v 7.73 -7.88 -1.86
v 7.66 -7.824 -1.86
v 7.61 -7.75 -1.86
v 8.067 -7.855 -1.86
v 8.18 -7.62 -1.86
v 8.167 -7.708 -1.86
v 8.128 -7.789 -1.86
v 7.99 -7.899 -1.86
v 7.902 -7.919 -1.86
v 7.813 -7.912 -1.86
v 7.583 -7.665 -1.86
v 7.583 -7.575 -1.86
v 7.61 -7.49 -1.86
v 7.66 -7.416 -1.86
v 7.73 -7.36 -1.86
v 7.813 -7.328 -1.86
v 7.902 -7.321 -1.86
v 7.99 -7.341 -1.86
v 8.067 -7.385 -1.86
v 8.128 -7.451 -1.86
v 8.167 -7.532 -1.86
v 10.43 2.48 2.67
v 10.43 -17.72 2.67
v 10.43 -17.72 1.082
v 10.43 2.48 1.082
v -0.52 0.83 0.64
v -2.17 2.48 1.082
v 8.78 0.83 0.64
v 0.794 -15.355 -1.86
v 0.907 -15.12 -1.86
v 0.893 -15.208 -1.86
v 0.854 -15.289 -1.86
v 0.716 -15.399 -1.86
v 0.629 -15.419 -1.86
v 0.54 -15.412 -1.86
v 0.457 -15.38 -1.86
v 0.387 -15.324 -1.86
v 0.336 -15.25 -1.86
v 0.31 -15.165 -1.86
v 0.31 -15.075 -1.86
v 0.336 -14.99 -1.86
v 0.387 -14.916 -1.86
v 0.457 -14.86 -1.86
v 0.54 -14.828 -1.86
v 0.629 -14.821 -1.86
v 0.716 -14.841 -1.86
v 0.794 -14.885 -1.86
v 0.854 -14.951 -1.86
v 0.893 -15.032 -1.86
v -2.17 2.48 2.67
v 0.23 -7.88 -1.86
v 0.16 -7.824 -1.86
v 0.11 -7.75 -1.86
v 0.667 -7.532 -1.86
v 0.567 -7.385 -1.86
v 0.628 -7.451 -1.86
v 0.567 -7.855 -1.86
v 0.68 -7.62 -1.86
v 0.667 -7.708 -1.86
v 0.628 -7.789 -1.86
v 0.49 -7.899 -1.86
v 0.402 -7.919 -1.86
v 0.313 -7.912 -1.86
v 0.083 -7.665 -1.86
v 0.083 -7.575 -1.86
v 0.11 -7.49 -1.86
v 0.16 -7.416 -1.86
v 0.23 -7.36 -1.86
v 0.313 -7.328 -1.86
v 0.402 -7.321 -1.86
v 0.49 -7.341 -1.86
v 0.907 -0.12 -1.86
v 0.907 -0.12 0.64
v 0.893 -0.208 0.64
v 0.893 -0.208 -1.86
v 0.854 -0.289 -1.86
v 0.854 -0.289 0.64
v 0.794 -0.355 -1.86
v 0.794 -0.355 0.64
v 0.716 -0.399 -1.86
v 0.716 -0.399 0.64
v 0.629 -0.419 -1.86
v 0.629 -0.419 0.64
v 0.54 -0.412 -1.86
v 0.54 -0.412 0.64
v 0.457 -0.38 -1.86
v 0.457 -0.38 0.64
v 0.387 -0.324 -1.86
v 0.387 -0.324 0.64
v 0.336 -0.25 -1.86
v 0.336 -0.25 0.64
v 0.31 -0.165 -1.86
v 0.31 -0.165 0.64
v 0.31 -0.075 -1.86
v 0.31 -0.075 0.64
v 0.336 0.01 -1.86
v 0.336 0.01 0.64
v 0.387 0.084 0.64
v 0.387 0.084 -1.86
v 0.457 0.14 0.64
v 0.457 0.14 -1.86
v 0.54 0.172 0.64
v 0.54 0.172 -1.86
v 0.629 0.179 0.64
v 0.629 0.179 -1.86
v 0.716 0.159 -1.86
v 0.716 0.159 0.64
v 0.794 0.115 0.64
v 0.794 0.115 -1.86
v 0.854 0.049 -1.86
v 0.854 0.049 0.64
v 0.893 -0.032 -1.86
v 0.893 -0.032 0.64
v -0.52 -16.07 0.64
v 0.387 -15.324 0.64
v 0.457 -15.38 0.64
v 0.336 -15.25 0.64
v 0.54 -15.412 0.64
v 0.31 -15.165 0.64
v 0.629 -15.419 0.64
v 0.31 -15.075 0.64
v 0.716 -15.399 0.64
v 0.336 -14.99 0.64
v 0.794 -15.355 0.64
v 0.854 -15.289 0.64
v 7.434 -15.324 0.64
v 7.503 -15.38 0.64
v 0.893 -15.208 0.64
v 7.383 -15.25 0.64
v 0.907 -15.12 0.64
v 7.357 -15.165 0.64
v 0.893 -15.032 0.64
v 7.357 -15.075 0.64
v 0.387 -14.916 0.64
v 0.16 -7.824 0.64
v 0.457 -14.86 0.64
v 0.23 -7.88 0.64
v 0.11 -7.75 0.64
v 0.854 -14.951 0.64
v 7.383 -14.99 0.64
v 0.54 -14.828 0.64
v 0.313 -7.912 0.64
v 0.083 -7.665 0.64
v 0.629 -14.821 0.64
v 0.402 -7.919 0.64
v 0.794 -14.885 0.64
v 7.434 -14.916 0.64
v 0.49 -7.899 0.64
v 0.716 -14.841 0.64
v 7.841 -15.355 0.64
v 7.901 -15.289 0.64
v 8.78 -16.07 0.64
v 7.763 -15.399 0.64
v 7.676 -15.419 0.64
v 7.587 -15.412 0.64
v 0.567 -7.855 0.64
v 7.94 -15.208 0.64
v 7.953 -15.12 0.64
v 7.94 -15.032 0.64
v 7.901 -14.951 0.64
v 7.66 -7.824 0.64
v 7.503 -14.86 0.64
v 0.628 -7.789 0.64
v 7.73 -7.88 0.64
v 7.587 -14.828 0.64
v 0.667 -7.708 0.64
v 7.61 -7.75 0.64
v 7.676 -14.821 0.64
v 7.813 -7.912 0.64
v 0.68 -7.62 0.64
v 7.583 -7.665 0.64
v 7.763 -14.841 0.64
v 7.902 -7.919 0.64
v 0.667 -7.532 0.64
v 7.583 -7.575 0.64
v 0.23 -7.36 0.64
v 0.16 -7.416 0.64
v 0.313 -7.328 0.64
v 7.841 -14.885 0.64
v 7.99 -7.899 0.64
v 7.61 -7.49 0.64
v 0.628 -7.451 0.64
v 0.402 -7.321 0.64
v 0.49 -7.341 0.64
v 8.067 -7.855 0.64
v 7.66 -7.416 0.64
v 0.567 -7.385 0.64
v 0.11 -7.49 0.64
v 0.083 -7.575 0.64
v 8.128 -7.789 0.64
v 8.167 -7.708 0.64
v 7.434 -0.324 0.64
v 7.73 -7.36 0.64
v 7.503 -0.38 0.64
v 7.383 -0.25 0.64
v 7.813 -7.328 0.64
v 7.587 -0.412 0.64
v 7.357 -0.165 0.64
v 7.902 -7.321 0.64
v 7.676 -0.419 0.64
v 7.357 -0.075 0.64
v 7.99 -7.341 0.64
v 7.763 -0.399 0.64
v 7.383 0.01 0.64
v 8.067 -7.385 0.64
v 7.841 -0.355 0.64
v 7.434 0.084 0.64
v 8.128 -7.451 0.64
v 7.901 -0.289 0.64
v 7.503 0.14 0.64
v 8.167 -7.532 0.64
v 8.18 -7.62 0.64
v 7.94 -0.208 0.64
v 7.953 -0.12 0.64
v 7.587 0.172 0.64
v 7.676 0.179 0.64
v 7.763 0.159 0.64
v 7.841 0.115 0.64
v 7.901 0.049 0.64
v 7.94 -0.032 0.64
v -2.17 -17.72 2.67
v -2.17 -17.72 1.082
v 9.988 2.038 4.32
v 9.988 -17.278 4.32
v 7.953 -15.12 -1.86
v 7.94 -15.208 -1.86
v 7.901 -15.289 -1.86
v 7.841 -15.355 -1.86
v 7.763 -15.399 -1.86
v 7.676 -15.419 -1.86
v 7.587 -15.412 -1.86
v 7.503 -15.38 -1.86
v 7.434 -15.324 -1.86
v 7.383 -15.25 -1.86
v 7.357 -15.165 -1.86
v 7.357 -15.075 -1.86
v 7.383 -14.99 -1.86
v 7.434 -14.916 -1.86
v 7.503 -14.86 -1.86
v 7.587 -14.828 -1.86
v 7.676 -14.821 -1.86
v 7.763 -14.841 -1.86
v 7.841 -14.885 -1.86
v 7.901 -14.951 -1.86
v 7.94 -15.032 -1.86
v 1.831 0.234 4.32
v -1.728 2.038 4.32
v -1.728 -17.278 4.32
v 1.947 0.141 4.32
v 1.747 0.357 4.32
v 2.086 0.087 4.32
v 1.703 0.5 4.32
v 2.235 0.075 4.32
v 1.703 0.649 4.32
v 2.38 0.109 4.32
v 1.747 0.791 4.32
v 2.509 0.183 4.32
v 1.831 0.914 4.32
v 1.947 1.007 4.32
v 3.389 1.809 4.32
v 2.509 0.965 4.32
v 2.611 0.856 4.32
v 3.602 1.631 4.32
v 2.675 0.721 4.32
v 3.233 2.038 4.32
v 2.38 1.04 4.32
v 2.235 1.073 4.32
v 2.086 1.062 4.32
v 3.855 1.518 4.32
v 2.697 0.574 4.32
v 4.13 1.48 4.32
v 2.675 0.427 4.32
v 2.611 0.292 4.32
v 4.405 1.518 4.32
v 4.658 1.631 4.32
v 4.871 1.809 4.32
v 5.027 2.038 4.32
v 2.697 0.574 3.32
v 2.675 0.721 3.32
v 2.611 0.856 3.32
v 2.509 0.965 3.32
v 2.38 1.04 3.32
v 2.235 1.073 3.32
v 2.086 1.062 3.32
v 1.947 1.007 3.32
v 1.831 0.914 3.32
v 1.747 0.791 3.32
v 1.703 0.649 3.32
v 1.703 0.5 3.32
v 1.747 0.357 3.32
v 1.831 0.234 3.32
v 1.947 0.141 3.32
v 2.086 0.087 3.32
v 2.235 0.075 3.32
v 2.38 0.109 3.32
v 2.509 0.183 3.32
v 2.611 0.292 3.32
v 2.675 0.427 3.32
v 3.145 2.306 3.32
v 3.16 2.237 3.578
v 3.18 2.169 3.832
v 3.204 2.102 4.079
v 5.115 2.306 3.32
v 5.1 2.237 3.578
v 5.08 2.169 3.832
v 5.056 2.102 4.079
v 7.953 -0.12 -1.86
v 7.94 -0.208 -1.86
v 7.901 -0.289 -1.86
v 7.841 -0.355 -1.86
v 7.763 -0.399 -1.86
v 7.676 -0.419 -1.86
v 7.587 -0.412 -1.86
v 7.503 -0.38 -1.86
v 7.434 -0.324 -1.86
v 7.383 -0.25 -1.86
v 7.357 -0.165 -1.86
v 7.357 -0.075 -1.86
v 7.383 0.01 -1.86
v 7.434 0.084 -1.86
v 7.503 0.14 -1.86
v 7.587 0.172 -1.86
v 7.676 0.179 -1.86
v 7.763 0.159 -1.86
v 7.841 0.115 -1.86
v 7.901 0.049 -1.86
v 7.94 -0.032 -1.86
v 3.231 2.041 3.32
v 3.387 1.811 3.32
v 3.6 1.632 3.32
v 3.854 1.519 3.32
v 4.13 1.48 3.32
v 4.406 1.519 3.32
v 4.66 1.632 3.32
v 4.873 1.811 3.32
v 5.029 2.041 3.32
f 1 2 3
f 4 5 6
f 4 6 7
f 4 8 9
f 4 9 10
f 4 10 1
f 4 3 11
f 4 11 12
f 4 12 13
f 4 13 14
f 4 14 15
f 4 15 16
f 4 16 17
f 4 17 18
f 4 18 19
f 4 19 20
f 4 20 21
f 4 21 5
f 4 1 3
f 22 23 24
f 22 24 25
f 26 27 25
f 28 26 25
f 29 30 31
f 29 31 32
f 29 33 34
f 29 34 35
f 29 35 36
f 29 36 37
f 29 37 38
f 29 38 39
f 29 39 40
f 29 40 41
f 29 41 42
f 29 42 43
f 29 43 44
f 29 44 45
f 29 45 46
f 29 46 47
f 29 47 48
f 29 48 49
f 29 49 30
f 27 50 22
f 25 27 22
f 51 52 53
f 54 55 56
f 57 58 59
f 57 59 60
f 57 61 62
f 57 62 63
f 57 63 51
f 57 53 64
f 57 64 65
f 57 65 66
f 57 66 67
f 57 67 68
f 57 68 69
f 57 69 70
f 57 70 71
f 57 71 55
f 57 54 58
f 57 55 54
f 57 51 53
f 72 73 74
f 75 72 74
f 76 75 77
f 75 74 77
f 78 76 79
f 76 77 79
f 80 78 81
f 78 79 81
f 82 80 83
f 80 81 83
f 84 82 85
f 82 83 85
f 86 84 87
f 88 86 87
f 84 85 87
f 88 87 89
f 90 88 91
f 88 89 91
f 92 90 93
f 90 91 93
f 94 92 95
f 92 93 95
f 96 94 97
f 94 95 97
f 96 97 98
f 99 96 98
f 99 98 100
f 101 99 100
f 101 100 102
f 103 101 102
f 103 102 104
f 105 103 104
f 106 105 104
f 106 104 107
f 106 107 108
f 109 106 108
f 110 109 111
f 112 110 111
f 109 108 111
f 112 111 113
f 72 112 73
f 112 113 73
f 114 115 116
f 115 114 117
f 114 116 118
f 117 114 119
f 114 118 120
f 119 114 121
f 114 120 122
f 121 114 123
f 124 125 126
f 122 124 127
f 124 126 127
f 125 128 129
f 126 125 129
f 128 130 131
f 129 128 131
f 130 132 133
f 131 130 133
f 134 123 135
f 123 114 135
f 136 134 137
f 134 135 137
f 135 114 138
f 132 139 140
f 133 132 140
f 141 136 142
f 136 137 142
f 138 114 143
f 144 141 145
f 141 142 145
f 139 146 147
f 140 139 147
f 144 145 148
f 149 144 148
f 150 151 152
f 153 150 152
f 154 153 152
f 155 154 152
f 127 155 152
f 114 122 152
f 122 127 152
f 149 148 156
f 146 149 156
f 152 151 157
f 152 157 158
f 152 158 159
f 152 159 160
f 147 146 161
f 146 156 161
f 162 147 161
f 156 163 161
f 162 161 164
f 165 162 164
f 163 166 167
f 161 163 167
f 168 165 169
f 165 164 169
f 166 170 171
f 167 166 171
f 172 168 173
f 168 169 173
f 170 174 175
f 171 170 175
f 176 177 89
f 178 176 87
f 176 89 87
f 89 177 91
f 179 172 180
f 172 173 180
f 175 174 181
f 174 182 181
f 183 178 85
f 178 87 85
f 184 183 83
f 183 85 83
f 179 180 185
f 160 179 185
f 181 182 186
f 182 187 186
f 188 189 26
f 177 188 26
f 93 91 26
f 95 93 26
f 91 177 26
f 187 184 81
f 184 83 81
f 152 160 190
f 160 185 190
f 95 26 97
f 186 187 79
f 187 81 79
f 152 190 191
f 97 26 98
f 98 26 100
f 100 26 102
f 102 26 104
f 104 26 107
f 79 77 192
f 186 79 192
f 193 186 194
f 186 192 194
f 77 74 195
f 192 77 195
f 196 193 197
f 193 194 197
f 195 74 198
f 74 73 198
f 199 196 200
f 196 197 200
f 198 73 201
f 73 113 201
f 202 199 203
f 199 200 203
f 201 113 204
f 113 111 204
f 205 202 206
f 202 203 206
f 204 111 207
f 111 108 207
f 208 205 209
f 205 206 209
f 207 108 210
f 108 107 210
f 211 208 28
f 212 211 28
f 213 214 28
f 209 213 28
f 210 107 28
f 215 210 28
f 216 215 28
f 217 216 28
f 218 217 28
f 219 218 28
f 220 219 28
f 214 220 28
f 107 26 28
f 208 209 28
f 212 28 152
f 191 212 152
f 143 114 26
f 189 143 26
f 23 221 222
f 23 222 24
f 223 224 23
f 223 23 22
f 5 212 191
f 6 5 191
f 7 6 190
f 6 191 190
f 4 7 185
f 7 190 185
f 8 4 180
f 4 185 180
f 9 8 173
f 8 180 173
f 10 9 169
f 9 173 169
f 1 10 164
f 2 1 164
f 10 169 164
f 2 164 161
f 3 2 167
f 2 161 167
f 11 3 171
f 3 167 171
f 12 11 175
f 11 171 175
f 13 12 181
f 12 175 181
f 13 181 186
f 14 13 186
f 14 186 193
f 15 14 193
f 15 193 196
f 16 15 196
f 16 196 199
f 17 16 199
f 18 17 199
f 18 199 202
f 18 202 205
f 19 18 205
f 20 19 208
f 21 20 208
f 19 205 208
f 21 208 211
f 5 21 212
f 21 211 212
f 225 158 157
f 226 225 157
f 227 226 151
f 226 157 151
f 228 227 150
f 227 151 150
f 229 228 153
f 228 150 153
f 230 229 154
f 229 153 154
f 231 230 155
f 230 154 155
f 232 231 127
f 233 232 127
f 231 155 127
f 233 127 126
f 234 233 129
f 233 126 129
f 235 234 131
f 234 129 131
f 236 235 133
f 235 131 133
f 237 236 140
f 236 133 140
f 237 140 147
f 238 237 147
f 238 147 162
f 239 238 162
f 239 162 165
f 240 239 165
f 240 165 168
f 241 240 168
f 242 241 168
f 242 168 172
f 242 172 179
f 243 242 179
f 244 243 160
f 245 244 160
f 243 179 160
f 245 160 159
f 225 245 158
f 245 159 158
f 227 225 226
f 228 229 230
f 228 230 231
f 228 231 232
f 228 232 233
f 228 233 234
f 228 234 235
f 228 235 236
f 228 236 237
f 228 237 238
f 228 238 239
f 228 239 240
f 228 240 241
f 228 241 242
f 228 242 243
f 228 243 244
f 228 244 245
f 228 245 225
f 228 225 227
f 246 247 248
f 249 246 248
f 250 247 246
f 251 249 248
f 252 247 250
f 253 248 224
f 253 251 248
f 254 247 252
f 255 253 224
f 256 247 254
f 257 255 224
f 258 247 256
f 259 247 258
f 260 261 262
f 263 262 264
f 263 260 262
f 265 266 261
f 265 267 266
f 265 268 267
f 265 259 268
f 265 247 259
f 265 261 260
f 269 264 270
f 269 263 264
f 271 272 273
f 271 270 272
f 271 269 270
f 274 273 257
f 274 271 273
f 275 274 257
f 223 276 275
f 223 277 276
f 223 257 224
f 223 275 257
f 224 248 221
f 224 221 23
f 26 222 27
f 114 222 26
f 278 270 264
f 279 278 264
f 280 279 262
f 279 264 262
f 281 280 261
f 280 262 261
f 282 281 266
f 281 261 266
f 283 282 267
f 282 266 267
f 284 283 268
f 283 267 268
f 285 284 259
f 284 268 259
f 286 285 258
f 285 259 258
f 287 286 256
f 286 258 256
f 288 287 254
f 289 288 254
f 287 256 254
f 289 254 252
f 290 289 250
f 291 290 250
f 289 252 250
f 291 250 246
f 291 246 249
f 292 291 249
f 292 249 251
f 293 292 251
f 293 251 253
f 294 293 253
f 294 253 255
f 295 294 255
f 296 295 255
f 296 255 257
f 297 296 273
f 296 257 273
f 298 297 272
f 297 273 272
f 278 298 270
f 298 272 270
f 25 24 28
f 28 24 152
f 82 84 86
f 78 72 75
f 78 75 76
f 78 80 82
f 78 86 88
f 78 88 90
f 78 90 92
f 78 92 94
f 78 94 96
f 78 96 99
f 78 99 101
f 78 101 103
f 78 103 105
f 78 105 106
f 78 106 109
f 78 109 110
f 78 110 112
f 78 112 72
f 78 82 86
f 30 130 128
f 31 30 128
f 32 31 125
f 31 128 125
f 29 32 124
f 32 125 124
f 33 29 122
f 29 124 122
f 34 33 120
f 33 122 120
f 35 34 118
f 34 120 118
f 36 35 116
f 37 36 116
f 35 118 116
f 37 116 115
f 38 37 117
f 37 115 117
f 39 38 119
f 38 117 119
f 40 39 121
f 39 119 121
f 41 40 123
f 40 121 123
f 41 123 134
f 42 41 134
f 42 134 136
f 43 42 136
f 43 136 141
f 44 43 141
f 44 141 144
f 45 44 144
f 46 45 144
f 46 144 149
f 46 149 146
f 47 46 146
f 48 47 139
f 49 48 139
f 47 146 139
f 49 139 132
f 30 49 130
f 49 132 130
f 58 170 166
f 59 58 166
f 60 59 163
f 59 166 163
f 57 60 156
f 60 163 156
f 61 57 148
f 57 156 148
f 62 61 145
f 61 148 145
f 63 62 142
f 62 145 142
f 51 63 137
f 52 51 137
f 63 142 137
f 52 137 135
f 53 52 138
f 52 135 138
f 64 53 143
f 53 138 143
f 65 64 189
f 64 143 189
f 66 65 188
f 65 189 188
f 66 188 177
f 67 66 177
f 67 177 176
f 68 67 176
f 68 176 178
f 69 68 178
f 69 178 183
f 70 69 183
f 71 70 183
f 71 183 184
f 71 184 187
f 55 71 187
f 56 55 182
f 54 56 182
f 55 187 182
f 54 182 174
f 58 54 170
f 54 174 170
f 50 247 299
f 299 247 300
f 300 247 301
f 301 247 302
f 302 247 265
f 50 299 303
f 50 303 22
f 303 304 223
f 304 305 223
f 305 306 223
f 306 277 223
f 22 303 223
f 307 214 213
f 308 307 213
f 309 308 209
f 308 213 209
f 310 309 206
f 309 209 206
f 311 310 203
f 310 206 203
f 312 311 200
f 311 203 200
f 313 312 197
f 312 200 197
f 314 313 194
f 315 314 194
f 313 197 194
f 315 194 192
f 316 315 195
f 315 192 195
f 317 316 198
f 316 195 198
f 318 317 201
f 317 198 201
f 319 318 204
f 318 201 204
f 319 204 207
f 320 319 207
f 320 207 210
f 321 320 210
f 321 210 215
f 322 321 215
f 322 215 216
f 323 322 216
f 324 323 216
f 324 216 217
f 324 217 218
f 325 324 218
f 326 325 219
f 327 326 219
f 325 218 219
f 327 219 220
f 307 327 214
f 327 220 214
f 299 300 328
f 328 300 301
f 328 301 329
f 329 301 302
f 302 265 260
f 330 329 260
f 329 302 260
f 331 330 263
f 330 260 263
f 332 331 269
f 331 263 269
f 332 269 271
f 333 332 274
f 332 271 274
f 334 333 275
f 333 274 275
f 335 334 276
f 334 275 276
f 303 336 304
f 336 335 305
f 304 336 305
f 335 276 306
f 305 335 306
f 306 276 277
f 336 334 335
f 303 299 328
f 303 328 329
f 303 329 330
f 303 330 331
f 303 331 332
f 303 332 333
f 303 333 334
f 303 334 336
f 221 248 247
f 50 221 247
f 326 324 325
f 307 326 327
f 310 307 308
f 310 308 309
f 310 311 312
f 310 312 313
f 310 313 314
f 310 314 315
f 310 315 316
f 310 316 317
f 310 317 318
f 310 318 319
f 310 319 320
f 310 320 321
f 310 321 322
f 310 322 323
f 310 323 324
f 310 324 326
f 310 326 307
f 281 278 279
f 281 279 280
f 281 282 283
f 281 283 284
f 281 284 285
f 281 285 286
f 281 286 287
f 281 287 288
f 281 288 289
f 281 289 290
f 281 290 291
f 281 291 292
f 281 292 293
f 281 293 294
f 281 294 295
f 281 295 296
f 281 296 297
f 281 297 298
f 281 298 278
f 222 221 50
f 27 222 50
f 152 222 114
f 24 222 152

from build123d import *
from OCP.BRepFilletAPI import BRepFilletAPI_MakeChamfer

# Parameters (mm, degrees)
SKETCH_2_W          = 12.6
SKETCH_2_H          = 20.2
EXTRUDE_1_DEPTH     = 3.68
CHAMFER_1_SIZE      = 1.65
CHAMFER_1_SIZE2     = 0.442116168
SKETCH_6_R          = 1
SKETCH_6_R_2        = 0.5
CUT_EXTRUDE_1_DEPTH = 1
SKETCH_7_R          = 0.3
EXTRUDE_2_DEPTH     = 2.5


with BuildPart() as part:
    # Эскиз2 → Вытянуть1 (new body)
    with BuildSketch(Plane.XY.offset(4.32)):
        with Locations((4.13, -7.62)):
            Rectangle(SKETCH_2_W, SKETCH_2_H)
    extrude(amount=-EXTRUDE_1_DEPTH)

    # Фаска1: one chamfer whose edges measure the first distance from different faces: ONE call of the kernel's chamfer builder (chamfer() names one face for all edges)
    chamfer_1_edges_1 = [part.edges().sort_by_distance(p)[0] for p in [
        (10.43, -7.62, 0.64),
        (4.13, 2.48, 0.64),
        (-2.17, -7.62, 0.64),
        (4.13, -17.72, 0.64),
    ]]
    chamfer_1_side_1 = [part.faces().sort_by_distance(p)[0] for p in [
        (4.13, -7.62, 0.64),
    ]]
    chamfer_1_edges_2 = [part.edges().sort_by_distance(p)[0] for p in [
        (4.13, 2.48, 4.32),
    ]]
    chamfer_1_side_2 = [part.faces().sort_by_distance(p)[0] for p in [
        (4.13, 2.48, 2.48),
    ]]
    chamfer_1_edges_3 = [part.edges().sort_by_distance(p)[0] for p in [
        (10.43, -7.62, 4.32),
    ]]
    chamfer_1_side_3 = [part.faces().sort_by_distance(p)[0] for p in [
        (10.43, -7.62, 2.48),
    ]]
    chamfer_1_edges_4 = [part.edges().sort_by_distance(p)[0] for p in [
        (4.13, -17.72, 4.32),
    ]]
    chamfer_1_side_4 = [part.faces().sort_by_distance(p)[0] for p in [
        (4.13, -17.72, 2.48),
    ]]
    chamfer_1_edges_5 = [part.edges().sort_by_distance(p)[0] for p in [
        (-2.17, -7.62, 4.32),
    ]]
    chamfer_1_side_5 = [part.faces().sort_by_distance(p)[0] for p in [
        (-2.17, -7.62, 2.48),
    ]]
    chamfer_1 = BRepFilletAPI_MakeChamfer(part.part.solid().wrapped)
    for e in chamfer_1_edges_1:
        chamfer_1.Add(CHAMFER_1_SIZE, CHAMFER_1_SIZE2, e.wrapped, chamfer_1_side_1[0].wrapped)  # the first distance lies on this face
    for e in chamfer_1_edges_2:
        chamfer_1.Add(CHAMFER_1_SIZE, CHAMFER_1_SIZE2, e.wrapped, chamfer_1_side_2[0].wrapped)  # the first distance lies on this face
    for e in chamfer_1_edges_3:
        chamfer_1.Add(CHAMFER_1_SIZE, CHAMFER_1_SIZE2, e.wrapped, chamfer_1_side_3[0].wrapped)  # the first distance lies on this face
    for e in chamfer_1_edges_4:
        chamfer_1.Add(CHAMFER_1_SIZE, CHAMFER_1_SIZE2, e.wrapped, chamfer_1_side_4[0].wrapped)  # the first distance lies on this face
    for e in chamfer_1_edges_5:
        chamfer_1.Add(CHAMFER_1_SIZE, CHAMFER_1_SIZE2, e.wrapped, chamfer_1_side_5[0].wrapped)  # the first distance lies on this face
    add(Compound.cast(chamfer_1.Shape()), mode=Mode.REPLACE)

    # Эскиз6 → Вырез-Вытянуть1 (cut)
    with BuildSketch(Plane.XY.offset(4.32)):
        with Locations((4.13, 2.48)):
            Circle(SKETCH_6_R)
        with Locations((2.197434959, 0.574075773)):
            Circle(SKETCH_6_R_2)
    extrude(amount=-CUT_EXTRUDE_1_DEPTH, mode=Mode.SUBTRACT)

    # Эскиз7 → Вытянуть2 (add)
    with BuildSketch(Plane(origin=(0, 0, 0.64), x_dir=(-1, 0, 0), z_dir=(0, 0, -1))):
        with Locations(Location((-7.88, -7.62, 0), (0, 0, 180))):
            Circle(SKETCH_7_R)
        with Locations(Location((-7.653482529, -0.12, 0), (0, 0, 180))):
            Circle(SKETCH_7_R)
        with Locations(Location((-7.653482529, -15.12, 0), (0, 0, 180))):
            Circle(SKETCH_7_R)
        with Locations(Location((-0.606517471, -15.12, 0), (0, 0, 180))):
            Circle(SKETCH_7_R)
        with Locations(Location((-0.606517471, -0.12, 0), (0, 0, 180))):
            Circle(SKETCH_7_R)
        with Locations(Location((-0.38, -7.62, 0), (0, 0, 180))):
            Circle(SKETCH_7_R)
    extrude(amount=EXTRUDE_2_DEPTH)


solid = part.part
